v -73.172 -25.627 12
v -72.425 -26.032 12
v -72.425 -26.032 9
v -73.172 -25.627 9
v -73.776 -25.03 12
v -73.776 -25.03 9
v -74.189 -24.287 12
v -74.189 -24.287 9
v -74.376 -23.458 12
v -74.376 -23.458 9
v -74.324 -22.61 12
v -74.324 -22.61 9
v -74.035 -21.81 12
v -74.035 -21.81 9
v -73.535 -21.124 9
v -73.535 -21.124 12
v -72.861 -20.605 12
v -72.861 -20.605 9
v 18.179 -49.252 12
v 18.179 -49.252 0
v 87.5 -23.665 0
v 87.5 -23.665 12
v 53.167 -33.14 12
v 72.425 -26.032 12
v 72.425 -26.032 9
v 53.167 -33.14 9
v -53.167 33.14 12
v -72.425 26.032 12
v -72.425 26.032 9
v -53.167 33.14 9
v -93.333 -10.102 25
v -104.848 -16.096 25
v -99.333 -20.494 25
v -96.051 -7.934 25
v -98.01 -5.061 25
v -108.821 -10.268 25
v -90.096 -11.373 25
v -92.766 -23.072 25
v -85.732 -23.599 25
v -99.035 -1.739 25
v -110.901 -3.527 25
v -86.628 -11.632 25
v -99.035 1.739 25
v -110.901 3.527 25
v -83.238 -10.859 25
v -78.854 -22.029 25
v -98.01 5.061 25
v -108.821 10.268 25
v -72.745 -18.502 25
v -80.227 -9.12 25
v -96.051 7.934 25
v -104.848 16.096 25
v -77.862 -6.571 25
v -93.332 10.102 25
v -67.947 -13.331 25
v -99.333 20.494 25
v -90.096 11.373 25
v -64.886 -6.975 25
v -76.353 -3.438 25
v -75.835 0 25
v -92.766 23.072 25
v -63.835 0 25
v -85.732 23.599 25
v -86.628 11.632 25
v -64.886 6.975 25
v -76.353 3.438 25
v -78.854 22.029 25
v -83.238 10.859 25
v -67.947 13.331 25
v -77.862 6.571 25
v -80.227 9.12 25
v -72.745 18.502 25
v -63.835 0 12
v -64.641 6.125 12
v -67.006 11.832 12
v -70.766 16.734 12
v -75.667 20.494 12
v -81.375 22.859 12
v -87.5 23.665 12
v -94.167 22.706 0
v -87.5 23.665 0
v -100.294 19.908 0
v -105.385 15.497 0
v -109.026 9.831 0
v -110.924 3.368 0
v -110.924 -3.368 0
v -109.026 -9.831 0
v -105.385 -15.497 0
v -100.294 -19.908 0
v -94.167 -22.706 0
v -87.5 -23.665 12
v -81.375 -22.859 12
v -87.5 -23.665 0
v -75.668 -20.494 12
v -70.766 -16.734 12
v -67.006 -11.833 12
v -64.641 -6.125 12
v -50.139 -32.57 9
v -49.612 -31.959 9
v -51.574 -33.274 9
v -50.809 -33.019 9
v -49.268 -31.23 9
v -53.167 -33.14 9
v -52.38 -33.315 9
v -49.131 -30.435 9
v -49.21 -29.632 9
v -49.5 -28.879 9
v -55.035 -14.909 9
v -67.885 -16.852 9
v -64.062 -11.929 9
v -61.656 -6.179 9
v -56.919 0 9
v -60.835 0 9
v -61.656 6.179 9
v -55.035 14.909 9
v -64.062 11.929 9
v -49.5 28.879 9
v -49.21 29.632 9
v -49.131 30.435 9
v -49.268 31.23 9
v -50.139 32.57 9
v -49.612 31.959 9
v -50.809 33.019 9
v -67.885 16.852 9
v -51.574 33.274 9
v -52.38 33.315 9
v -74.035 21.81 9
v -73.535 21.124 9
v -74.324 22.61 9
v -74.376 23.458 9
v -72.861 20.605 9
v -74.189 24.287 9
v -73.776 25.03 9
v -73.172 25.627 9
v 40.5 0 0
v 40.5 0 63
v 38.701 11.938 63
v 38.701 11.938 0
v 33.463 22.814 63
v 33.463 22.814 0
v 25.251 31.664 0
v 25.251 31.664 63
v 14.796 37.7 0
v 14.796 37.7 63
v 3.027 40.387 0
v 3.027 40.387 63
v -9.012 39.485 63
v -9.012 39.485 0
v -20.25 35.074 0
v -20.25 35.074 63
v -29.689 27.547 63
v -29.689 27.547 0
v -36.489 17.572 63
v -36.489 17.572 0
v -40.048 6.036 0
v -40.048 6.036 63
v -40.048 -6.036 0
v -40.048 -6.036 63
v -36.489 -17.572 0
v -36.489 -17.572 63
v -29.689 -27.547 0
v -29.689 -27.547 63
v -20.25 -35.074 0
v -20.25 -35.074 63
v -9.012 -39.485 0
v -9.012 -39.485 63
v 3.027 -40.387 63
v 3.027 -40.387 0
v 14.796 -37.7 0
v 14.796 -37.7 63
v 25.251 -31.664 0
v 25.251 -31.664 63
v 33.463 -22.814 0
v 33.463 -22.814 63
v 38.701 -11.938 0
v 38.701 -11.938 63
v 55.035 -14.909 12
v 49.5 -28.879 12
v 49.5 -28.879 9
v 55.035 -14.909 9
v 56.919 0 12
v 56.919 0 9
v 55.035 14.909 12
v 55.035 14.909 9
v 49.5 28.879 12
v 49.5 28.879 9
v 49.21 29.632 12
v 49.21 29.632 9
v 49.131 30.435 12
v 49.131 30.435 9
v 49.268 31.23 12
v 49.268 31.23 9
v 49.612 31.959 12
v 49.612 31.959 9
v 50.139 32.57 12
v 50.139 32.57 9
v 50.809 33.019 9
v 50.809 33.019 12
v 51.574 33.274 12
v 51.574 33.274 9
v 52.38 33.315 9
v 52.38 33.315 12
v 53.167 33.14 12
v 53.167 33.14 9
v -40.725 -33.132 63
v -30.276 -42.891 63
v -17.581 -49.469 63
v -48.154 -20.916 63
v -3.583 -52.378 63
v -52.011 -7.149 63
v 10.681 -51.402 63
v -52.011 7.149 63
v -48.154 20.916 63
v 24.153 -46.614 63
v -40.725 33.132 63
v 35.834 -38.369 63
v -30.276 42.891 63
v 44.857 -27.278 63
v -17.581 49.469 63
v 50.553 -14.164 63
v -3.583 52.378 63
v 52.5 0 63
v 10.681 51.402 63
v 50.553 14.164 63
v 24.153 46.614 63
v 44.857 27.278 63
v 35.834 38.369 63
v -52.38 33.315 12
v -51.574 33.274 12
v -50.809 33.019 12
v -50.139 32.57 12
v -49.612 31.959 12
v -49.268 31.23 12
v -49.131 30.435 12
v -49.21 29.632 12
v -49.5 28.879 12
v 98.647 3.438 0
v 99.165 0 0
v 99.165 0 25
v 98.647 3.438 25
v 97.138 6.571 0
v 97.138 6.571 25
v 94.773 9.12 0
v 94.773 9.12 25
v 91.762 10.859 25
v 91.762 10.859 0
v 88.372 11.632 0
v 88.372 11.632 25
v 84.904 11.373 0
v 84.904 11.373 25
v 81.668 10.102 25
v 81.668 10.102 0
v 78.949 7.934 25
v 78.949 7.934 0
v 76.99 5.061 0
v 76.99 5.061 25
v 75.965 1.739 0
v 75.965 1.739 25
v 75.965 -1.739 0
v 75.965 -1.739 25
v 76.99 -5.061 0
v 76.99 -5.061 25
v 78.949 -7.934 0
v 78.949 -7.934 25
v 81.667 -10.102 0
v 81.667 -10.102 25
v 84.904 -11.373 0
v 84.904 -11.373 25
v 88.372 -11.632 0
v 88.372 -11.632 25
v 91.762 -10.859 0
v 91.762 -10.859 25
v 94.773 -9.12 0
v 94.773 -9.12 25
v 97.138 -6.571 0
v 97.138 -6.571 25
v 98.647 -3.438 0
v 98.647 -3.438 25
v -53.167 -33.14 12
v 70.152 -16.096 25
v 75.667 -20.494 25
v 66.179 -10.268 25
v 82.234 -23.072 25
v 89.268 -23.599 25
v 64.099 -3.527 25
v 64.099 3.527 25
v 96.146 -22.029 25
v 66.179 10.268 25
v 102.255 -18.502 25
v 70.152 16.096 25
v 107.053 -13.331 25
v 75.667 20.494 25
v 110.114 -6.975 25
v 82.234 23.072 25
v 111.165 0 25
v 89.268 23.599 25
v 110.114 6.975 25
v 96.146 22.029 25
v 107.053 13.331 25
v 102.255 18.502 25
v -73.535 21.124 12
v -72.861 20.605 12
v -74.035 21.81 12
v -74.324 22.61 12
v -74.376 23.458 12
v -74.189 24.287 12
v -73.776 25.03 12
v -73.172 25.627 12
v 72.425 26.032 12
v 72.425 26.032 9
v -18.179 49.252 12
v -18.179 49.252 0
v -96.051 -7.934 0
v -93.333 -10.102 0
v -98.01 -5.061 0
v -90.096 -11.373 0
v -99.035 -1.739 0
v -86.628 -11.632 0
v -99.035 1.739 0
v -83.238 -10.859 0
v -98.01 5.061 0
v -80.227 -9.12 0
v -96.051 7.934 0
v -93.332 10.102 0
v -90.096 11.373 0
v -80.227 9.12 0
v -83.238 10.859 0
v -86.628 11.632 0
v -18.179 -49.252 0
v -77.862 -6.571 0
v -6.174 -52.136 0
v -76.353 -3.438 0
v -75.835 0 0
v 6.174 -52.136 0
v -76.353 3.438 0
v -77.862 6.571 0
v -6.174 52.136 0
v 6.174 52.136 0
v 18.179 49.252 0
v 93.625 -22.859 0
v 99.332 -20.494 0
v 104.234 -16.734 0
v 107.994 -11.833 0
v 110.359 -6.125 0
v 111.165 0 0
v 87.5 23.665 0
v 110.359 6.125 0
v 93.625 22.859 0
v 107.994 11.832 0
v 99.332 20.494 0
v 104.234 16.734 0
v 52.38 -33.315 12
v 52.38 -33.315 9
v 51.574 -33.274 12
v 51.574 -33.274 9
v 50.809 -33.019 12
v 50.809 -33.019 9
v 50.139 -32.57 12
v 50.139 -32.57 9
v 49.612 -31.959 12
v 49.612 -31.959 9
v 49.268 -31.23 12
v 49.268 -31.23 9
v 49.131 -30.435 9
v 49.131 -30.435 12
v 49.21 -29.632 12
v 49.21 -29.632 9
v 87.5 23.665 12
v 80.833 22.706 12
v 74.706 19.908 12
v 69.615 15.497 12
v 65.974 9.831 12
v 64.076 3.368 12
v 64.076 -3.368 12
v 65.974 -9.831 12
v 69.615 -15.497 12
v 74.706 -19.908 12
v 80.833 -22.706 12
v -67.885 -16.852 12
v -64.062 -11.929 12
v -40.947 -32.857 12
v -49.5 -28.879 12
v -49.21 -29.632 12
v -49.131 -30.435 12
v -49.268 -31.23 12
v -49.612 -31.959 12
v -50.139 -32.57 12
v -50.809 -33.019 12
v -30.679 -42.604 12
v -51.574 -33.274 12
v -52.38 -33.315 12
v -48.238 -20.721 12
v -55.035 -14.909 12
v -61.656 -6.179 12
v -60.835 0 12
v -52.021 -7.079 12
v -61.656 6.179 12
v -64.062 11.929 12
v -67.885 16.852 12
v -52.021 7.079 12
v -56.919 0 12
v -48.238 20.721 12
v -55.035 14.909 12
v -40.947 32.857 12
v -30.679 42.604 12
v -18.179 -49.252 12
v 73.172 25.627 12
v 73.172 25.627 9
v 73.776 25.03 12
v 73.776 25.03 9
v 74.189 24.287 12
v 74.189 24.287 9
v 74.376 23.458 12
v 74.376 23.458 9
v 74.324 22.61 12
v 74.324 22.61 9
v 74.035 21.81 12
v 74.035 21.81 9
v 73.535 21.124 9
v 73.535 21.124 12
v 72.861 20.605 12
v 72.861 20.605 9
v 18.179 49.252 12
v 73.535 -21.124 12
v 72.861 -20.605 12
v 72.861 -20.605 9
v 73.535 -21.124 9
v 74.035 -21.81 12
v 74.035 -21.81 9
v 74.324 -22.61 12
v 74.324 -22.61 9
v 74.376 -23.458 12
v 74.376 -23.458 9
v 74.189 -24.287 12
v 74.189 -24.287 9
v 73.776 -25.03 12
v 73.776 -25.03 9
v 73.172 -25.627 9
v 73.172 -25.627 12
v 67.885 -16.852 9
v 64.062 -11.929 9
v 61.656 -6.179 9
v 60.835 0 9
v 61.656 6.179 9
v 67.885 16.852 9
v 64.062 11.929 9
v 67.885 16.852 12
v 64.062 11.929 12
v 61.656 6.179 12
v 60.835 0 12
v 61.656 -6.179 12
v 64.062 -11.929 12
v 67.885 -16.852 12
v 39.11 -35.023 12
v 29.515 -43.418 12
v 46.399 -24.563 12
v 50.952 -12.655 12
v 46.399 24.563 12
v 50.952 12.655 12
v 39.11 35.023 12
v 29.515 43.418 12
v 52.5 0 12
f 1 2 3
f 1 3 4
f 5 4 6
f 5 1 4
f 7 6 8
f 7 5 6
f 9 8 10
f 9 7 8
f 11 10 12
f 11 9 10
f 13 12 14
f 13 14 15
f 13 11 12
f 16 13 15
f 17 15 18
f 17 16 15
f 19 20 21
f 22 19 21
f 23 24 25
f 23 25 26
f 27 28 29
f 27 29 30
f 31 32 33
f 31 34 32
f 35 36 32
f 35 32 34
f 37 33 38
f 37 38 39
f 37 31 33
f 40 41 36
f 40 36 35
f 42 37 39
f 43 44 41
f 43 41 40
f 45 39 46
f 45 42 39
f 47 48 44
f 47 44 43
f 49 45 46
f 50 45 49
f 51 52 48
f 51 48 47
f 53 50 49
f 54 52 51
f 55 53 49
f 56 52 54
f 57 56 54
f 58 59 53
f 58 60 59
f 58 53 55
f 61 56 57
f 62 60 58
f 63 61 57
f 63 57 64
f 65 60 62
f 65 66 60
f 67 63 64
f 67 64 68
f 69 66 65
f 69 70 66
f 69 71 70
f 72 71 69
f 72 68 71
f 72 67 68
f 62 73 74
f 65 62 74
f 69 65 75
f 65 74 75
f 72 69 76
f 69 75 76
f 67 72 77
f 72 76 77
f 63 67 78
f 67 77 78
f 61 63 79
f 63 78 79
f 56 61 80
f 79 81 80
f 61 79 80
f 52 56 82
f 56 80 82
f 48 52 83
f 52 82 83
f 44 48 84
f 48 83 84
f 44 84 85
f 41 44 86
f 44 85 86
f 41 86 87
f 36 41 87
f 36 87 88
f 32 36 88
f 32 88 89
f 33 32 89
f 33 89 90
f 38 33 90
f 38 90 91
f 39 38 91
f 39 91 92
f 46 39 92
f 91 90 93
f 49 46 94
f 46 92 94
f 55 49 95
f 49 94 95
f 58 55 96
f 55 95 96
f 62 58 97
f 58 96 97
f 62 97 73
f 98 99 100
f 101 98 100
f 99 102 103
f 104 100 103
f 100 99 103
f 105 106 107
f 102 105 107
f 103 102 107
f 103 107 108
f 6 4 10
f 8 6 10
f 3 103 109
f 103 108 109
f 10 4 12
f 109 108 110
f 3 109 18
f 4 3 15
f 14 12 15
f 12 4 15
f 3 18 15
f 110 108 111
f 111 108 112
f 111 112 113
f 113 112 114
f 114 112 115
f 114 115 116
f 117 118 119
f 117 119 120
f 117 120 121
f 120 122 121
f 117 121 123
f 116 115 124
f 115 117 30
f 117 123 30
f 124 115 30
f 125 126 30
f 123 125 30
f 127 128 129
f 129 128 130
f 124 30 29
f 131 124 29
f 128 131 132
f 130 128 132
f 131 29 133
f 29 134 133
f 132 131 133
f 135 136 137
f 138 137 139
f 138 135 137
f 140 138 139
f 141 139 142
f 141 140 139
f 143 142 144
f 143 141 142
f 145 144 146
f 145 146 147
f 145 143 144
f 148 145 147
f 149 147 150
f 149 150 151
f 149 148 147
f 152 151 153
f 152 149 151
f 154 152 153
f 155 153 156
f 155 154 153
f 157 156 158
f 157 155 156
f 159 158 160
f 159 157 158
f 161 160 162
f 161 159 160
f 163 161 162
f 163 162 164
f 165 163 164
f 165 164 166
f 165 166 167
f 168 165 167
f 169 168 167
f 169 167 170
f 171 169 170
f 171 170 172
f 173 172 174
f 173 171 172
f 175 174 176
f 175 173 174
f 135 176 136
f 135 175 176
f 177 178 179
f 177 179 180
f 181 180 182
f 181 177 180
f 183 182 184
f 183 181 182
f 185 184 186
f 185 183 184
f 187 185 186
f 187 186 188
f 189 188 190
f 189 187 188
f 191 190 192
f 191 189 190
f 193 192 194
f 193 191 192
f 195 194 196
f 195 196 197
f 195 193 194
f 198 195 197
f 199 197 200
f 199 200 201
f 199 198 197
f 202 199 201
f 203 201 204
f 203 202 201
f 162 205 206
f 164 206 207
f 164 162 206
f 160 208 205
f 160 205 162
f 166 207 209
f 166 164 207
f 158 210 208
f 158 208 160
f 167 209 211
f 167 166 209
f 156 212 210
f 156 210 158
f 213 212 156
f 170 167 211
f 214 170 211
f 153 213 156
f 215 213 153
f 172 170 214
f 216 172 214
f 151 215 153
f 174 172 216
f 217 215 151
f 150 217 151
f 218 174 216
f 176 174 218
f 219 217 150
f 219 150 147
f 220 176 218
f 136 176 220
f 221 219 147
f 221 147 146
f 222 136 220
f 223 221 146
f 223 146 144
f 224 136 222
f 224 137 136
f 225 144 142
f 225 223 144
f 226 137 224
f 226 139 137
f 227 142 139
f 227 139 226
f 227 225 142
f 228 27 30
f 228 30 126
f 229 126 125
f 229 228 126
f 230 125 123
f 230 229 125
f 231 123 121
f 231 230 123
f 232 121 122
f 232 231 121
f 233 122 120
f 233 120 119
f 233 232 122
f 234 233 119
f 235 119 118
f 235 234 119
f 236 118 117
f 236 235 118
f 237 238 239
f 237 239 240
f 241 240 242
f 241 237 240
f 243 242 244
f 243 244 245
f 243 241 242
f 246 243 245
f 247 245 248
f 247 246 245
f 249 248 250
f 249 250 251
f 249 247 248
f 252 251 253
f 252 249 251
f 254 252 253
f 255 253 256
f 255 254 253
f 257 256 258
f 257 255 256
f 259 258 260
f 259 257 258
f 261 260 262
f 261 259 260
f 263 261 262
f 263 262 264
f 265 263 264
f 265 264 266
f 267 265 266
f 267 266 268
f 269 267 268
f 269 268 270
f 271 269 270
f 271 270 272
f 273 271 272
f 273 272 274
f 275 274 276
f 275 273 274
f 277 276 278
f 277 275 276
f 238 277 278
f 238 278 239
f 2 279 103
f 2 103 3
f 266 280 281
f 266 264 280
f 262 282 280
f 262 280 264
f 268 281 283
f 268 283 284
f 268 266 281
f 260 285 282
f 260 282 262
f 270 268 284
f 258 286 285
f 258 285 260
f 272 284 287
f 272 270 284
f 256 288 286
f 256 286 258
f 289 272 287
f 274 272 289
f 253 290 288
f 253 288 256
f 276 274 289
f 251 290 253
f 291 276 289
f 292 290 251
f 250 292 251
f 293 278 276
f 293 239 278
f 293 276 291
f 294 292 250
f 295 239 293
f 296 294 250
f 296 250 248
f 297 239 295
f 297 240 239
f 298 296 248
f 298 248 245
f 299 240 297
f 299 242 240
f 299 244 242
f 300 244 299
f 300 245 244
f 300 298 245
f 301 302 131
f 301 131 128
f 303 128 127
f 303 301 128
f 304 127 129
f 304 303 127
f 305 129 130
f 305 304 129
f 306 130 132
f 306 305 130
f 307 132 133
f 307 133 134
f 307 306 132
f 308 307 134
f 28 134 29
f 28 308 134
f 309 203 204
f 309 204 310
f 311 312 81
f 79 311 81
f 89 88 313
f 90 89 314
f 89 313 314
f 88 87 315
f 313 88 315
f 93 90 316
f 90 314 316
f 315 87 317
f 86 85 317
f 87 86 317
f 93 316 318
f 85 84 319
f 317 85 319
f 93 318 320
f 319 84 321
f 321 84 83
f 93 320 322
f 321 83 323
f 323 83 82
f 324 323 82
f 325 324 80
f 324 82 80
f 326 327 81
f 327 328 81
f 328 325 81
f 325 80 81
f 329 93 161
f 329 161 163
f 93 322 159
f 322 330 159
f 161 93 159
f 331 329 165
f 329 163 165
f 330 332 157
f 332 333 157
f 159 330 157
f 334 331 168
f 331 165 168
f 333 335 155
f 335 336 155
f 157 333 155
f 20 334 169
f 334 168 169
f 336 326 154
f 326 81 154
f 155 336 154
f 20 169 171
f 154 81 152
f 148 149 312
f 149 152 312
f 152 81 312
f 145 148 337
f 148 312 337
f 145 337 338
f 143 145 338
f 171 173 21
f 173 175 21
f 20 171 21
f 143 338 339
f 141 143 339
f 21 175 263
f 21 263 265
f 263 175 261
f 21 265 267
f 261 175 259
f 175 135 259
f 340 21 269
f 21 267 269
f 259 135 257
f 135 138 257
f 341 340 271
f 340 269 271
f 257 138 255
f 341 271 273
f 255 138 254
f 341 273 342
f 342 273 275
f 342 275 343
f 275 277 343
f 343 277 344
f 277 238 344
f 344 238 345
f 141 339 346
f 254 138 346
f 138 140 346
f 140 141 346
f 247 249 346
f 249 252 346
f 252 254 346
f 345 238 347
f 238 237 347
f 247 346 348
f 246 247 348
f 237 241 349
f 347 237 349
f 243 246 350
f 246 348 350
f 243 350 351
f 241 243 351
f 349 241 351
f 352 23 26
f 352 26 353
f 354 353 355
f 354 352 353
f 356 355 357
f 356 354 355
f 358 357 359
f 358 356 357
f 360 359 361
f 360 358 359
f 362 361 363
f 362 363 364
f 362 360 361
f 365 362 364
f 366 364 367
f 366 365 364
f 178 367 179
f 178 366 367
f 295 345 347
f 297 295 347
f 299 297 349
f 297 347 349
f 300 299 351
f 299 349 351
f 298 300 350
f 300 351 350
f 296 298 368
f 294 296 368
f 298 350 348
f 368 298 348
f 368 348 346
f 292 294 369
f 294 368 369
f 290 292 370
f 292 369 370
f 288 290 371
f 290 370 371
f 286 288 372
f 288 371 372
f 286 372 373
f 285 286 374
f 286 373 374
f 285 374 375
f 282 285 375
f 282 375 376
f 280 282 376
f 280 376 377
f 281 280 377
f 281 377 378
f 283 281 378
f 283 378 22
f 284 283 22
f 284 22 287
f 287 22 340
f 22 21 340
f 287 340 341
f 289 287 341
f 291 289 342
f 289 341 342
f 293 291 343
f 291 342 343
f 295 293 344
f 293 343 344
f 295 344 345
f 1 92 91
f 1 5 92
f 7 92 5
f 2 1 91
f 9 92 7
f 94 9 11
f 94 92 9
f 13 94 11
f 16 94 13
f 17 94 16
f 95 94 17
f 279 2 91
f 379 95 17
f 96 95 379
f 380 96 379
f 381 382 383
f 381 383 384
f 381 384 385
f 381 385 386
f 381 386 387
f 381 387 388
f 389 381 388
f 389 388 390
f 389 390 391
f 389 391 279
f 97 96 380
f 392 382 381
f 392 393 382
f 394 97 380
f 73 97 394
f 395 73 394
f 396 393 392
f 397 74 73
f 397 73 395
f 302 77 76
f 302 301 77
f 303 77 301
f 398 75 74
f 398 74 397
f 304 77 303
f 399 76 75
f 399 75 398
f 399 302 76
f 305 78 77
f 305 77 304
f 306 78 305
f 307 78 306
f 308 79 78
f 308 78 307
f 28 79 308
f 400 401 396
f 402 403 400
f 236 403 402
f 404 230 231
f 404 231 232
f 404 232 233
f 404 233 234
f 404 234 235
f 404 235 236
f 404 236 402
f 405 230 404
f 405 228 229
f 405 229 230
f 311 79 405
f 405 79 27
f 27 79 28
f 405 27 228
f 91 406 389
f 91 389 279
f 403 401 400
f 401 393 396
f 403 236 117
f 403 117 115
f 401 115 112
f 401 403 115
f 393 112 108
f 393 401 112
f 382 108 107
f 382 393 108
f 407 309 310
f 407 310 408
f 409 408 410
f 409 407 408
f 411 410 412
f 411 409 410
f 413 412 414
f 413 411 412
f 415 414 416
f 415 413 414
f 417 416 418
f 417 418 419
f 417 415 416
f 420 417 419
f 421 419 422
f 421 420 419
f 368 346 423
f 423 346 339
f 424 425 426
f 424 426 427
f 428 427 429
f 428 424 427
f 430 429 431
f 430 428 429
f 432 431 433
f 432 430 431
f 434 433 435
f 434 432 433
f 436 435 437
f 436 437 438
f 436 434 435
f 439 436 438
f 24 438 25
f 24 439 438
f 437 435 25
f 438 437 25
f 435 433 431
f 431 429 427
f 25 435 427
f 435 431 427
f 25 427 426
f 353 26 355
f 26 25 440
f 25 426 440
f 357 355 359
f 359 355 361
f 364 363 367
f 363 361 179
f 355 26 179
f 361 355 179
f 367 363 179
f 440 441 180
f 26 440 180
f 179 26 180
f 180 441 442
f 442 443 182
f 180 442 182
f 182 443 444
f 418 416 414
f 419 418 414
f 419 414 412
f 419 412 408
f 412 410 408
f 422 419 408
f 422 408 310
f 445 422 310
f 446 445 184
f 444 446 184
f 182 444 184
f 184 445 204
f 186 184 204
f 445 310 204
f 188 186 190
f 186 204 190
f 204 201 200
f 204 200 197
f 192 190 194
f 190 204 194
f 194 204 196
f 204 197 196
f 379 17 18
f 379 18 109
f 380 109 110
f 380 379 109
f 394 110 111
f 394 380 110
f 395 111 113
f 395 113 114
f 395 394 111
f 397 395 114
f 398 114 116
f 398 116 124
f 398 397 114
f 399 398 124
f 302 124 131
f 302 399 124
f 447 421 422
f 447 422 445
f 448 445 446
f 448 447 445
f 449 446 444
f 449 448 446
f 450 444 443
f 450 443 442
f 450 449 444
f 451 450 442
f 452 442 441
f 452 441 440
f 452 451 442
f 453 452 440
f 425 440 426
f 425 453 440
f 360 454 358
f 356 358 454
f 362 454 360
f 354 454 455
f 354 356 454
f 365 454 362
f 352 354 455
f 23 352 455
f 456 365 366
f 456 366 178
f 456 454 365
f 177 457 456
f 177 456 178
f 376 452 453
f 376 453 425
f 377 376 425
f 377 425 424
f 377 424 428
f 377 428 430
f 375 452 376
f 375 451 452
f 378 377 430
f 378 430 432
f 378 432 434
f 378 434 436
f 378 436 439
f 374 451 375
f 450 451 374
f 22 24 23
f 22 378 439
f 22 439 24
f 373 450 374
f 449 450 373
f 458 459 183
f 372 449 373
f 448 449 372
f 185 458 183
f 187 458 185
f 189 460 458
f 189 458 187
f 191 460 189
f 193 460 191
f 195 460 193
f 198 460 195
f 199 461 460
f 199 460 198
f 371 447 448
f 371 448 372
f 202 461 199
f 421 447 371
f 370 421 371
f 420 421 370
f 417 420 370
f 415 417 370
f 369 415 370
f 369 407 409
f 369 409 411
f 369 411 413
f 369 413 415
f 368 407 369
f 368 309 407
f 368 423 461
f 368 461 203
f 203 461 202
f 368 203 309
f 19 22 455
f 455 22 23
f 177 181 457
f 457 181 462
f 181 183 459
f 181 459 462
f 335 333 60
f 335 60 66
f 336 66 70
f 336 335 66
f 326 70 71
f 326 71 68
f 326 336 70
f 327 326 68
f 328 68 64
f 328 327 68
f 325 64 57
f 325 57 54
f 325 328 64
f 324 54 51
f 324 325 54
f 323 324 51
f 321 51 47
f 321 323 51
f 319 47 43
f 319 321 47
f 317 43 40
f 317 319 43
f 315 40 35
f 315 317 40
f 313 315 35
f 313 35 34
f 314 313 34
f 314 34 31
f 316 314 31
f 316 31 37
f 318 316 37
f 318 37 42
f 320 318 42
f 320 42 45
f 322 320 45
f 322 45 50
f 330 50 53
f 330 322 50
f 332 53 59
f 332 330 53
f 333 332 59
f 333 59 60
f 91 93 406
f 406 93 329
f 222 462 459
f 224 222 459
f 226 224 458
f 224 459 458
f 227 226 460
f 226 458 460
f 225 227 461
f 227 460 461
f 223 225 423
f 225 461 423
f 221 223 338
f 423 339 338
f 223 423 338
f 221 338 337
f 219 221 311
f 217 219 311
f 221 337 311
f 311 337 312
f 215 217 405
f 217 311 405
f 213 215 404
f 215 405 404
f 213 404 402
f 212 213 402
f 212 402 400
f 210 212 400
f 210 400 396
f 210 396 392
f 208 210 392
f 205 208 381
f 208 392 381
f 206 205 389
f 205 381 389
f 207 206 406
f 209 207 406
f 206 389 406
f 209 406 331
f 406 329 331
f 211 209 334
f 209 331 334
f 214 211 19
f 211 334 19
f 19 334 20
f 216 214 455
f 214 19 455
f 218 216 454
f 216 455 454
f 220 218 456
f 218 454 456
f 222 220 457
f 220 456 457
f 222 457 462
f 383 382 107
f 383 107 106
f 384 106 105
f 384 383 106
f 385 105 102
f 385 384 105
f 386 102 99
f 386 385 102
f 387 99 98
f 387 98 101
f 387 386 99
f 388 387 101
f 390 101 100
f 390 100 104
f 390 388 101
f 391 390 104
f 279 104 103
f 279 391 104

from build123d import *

# Parameters (mm, degrees)
SHAFT_MOUNT_SKETCH_R           = 52.5
SHAFT_MOUNT_SKETCH_R_2         = 40.5
CYLINDRICAL_BORE_EXTRUDE_DEPTH = 63
SKETCH1_3_R                    = 23.665
SKETCH1_3_R_2                  = 11.665
BOLT_HOLES_EXTRUDE_DEPTH       = 25
BOLT_HOLES_EXTRUDE_2_DEPTH     = 25
SHAFT_MOUNT_GUSSETS_DEPTH      = 12
FLANGE_START                   = 12
FLANGE_EXTRUDED_CUT_1_DEPTH    = 3
FLANGE_EXTRUDED_CUT_2_DEPTH    = 3


with BuildPart() as part:
    # Shaft Mount Sketch → Cylindrical Bore Extrude (new body)
    with BuildSketch(Plane.XY):
        Circle(SHAFT_MOUNT_SKETCH_R)
        Circle(SHAFT_MOUNT_SKETCH_R_2, mode=Mode.SUBTRACT)
    extrude(amount=CYLINDRICAL_BORE_EXTRUDE_DEPTH)



with BuildPart() as body_2:
    # Sketch1<3> → Bolt Holes Extrude (new body)
    with BuildSketch(Plane.XY):
        with Locations((-87.5, 0)):
            Circle(SKETCH1_3_R)
        with Locations((-87.5, 0)):
            Circle(SKETCH1_3_R_2, mode=Mode.SUBTRACT)
    extrude(amount=BOLT_HOLES_EXTRUDE_DEPTH)


with BuildPart() as body_3:
    # Sketch1<3> → Bolt Holes Extrude 2 (new body)
    with BuildSketch(Plane.XY):
        with Locations((87.5, 0)):
            Circle(SKETCH1_3_R)
        with Locations((87.5, 0)):
            Circle(SKETCH1_3_R_2, mode=Mode.SUBTRACT)
    extrude(amount=BOLT_HOLES_EXTRUDE_2_DEPTH)


with BuildPart() as part_1:
    add(part.part)

    add(body_2.part)  # Shaft Mount Gussets merges body 2

    add(body_3.part)  # Shaft Mount Gussets merges body 3
    # Sketch1<4> → Shaft Mount Gussets (add)
    with BuildSketch(Plane.XY):
        with BuildLine():
            Line((-18.179450038, 49.251980634), (-87.5, 23.665))
            ThreePointArc((-87.5, 23.665), (-63.835, 0), (-87.5, -23.665))
            Line((-87.5, -23.665), (-18.179450038, -49.251980634))
            ThreePointArc((-18.179450038, -49.251980634), (-52.5, 0), (-18.179450038, 49.251980634))
        make_face()
        with BuildLine():
            Line((87.5, 23.665), (18.179450038, 49.251980634))
            ThreePointArc((18.179450038, 49.251980634), (52.5, 0), (18.179450038, -49.251980634))
            Line((18.179450038, -49.251980634), (87.5, -23.665))
            ThreePointArc((87.5, -23.665), (63.835, 0), (87.5, 23.665))
        make_face()
    extrude(amount=SHAFT_MOUNT_GUSSETS_DEPTH)

    # Socket Sketch<6> → Flange Extruded Cut 1 (cut)
    with BuildSketch(Plane.XY.offset(FLANGE_START)):
        with BuildLine():
            ThreePointArc((53.167380744, -33.139708031), (49.854923731, -32.28250119), (49.5, -28.879384358))
            ThreePointArc((49.5, -28.879384358), (56.918852132, 0), (49.5, 28.879384358))
            ThreePointArc((49.5, 28.879384358), (49.854923731, 32.28250119), (53.167380744, 33.139708031))
            Line((53.167380744, 33.139708031), (72.424639318, 26.031641195))
            ThreePointArc((72.424639318, 26.031641195), (74.376149951, 23.457842629), (72.861251786, 20.605139287))
            ThreePointArc((72.861251786, 20.605139287), (60.835, 0), (72.861251786, -20.605139287))
            ThreePointArc((72.861251786, -20.605139287), (74.376149951, -23.457842629), (72.424639318, -26.031641195))
            Line((72.424639318, -26.031641195), (53.167380744, -33.139708031))
        make_face()
    extrude(amount=-FLANGE_EXTRUDED_CUT_1_DEPTH, mode=Mode.SUBTRACT)

    # Socket Sketch<7> → Flange Extruded Cut 2 (cut)
    with BuildSketch(Plane.XY.offset(FLANGE_START)):
        with BuildLine():
            ThreePointArc((-49.5, 28.879384358), (-56.918852132, 0), (-49.5, -28.879384358))
            ThreePointArc((-49.5, -28.879384358), (-49.854923731, -32.28250119), (-53.167380744, -33.139708031))
            Line((-53.167380744, -33.139708031), (-72.424639318, -26.031641195))
            ThreePointArc((-72.424639318, -26.031641195), (-74.376149951, -23.457842629), (-72.861251786, -20.605139287))
            ThreePointArc((-72.861251786, -20.605139287), (-60.835, 0), (-72.861251786, 20.605139287))
            ThreePointArc((-72.861251786, 20.605139287), (-74.376149951, 23.457842629), (-72.424639318, 26.031641195))
            Line((-72.424639318, 26.031641195), (-53.167380744, 33.139708031))
            ThreePointArc((-53.167380744, 33.139708031), (-49.854923731, 32.28250119), (-49.5, 28.879384358))
        make_face()
    extrude(amount=-FLANGE_EXTRUDED_CUT_2_DEPTH, mode=Mode.SUBTRACT)


solid = part_1.part
